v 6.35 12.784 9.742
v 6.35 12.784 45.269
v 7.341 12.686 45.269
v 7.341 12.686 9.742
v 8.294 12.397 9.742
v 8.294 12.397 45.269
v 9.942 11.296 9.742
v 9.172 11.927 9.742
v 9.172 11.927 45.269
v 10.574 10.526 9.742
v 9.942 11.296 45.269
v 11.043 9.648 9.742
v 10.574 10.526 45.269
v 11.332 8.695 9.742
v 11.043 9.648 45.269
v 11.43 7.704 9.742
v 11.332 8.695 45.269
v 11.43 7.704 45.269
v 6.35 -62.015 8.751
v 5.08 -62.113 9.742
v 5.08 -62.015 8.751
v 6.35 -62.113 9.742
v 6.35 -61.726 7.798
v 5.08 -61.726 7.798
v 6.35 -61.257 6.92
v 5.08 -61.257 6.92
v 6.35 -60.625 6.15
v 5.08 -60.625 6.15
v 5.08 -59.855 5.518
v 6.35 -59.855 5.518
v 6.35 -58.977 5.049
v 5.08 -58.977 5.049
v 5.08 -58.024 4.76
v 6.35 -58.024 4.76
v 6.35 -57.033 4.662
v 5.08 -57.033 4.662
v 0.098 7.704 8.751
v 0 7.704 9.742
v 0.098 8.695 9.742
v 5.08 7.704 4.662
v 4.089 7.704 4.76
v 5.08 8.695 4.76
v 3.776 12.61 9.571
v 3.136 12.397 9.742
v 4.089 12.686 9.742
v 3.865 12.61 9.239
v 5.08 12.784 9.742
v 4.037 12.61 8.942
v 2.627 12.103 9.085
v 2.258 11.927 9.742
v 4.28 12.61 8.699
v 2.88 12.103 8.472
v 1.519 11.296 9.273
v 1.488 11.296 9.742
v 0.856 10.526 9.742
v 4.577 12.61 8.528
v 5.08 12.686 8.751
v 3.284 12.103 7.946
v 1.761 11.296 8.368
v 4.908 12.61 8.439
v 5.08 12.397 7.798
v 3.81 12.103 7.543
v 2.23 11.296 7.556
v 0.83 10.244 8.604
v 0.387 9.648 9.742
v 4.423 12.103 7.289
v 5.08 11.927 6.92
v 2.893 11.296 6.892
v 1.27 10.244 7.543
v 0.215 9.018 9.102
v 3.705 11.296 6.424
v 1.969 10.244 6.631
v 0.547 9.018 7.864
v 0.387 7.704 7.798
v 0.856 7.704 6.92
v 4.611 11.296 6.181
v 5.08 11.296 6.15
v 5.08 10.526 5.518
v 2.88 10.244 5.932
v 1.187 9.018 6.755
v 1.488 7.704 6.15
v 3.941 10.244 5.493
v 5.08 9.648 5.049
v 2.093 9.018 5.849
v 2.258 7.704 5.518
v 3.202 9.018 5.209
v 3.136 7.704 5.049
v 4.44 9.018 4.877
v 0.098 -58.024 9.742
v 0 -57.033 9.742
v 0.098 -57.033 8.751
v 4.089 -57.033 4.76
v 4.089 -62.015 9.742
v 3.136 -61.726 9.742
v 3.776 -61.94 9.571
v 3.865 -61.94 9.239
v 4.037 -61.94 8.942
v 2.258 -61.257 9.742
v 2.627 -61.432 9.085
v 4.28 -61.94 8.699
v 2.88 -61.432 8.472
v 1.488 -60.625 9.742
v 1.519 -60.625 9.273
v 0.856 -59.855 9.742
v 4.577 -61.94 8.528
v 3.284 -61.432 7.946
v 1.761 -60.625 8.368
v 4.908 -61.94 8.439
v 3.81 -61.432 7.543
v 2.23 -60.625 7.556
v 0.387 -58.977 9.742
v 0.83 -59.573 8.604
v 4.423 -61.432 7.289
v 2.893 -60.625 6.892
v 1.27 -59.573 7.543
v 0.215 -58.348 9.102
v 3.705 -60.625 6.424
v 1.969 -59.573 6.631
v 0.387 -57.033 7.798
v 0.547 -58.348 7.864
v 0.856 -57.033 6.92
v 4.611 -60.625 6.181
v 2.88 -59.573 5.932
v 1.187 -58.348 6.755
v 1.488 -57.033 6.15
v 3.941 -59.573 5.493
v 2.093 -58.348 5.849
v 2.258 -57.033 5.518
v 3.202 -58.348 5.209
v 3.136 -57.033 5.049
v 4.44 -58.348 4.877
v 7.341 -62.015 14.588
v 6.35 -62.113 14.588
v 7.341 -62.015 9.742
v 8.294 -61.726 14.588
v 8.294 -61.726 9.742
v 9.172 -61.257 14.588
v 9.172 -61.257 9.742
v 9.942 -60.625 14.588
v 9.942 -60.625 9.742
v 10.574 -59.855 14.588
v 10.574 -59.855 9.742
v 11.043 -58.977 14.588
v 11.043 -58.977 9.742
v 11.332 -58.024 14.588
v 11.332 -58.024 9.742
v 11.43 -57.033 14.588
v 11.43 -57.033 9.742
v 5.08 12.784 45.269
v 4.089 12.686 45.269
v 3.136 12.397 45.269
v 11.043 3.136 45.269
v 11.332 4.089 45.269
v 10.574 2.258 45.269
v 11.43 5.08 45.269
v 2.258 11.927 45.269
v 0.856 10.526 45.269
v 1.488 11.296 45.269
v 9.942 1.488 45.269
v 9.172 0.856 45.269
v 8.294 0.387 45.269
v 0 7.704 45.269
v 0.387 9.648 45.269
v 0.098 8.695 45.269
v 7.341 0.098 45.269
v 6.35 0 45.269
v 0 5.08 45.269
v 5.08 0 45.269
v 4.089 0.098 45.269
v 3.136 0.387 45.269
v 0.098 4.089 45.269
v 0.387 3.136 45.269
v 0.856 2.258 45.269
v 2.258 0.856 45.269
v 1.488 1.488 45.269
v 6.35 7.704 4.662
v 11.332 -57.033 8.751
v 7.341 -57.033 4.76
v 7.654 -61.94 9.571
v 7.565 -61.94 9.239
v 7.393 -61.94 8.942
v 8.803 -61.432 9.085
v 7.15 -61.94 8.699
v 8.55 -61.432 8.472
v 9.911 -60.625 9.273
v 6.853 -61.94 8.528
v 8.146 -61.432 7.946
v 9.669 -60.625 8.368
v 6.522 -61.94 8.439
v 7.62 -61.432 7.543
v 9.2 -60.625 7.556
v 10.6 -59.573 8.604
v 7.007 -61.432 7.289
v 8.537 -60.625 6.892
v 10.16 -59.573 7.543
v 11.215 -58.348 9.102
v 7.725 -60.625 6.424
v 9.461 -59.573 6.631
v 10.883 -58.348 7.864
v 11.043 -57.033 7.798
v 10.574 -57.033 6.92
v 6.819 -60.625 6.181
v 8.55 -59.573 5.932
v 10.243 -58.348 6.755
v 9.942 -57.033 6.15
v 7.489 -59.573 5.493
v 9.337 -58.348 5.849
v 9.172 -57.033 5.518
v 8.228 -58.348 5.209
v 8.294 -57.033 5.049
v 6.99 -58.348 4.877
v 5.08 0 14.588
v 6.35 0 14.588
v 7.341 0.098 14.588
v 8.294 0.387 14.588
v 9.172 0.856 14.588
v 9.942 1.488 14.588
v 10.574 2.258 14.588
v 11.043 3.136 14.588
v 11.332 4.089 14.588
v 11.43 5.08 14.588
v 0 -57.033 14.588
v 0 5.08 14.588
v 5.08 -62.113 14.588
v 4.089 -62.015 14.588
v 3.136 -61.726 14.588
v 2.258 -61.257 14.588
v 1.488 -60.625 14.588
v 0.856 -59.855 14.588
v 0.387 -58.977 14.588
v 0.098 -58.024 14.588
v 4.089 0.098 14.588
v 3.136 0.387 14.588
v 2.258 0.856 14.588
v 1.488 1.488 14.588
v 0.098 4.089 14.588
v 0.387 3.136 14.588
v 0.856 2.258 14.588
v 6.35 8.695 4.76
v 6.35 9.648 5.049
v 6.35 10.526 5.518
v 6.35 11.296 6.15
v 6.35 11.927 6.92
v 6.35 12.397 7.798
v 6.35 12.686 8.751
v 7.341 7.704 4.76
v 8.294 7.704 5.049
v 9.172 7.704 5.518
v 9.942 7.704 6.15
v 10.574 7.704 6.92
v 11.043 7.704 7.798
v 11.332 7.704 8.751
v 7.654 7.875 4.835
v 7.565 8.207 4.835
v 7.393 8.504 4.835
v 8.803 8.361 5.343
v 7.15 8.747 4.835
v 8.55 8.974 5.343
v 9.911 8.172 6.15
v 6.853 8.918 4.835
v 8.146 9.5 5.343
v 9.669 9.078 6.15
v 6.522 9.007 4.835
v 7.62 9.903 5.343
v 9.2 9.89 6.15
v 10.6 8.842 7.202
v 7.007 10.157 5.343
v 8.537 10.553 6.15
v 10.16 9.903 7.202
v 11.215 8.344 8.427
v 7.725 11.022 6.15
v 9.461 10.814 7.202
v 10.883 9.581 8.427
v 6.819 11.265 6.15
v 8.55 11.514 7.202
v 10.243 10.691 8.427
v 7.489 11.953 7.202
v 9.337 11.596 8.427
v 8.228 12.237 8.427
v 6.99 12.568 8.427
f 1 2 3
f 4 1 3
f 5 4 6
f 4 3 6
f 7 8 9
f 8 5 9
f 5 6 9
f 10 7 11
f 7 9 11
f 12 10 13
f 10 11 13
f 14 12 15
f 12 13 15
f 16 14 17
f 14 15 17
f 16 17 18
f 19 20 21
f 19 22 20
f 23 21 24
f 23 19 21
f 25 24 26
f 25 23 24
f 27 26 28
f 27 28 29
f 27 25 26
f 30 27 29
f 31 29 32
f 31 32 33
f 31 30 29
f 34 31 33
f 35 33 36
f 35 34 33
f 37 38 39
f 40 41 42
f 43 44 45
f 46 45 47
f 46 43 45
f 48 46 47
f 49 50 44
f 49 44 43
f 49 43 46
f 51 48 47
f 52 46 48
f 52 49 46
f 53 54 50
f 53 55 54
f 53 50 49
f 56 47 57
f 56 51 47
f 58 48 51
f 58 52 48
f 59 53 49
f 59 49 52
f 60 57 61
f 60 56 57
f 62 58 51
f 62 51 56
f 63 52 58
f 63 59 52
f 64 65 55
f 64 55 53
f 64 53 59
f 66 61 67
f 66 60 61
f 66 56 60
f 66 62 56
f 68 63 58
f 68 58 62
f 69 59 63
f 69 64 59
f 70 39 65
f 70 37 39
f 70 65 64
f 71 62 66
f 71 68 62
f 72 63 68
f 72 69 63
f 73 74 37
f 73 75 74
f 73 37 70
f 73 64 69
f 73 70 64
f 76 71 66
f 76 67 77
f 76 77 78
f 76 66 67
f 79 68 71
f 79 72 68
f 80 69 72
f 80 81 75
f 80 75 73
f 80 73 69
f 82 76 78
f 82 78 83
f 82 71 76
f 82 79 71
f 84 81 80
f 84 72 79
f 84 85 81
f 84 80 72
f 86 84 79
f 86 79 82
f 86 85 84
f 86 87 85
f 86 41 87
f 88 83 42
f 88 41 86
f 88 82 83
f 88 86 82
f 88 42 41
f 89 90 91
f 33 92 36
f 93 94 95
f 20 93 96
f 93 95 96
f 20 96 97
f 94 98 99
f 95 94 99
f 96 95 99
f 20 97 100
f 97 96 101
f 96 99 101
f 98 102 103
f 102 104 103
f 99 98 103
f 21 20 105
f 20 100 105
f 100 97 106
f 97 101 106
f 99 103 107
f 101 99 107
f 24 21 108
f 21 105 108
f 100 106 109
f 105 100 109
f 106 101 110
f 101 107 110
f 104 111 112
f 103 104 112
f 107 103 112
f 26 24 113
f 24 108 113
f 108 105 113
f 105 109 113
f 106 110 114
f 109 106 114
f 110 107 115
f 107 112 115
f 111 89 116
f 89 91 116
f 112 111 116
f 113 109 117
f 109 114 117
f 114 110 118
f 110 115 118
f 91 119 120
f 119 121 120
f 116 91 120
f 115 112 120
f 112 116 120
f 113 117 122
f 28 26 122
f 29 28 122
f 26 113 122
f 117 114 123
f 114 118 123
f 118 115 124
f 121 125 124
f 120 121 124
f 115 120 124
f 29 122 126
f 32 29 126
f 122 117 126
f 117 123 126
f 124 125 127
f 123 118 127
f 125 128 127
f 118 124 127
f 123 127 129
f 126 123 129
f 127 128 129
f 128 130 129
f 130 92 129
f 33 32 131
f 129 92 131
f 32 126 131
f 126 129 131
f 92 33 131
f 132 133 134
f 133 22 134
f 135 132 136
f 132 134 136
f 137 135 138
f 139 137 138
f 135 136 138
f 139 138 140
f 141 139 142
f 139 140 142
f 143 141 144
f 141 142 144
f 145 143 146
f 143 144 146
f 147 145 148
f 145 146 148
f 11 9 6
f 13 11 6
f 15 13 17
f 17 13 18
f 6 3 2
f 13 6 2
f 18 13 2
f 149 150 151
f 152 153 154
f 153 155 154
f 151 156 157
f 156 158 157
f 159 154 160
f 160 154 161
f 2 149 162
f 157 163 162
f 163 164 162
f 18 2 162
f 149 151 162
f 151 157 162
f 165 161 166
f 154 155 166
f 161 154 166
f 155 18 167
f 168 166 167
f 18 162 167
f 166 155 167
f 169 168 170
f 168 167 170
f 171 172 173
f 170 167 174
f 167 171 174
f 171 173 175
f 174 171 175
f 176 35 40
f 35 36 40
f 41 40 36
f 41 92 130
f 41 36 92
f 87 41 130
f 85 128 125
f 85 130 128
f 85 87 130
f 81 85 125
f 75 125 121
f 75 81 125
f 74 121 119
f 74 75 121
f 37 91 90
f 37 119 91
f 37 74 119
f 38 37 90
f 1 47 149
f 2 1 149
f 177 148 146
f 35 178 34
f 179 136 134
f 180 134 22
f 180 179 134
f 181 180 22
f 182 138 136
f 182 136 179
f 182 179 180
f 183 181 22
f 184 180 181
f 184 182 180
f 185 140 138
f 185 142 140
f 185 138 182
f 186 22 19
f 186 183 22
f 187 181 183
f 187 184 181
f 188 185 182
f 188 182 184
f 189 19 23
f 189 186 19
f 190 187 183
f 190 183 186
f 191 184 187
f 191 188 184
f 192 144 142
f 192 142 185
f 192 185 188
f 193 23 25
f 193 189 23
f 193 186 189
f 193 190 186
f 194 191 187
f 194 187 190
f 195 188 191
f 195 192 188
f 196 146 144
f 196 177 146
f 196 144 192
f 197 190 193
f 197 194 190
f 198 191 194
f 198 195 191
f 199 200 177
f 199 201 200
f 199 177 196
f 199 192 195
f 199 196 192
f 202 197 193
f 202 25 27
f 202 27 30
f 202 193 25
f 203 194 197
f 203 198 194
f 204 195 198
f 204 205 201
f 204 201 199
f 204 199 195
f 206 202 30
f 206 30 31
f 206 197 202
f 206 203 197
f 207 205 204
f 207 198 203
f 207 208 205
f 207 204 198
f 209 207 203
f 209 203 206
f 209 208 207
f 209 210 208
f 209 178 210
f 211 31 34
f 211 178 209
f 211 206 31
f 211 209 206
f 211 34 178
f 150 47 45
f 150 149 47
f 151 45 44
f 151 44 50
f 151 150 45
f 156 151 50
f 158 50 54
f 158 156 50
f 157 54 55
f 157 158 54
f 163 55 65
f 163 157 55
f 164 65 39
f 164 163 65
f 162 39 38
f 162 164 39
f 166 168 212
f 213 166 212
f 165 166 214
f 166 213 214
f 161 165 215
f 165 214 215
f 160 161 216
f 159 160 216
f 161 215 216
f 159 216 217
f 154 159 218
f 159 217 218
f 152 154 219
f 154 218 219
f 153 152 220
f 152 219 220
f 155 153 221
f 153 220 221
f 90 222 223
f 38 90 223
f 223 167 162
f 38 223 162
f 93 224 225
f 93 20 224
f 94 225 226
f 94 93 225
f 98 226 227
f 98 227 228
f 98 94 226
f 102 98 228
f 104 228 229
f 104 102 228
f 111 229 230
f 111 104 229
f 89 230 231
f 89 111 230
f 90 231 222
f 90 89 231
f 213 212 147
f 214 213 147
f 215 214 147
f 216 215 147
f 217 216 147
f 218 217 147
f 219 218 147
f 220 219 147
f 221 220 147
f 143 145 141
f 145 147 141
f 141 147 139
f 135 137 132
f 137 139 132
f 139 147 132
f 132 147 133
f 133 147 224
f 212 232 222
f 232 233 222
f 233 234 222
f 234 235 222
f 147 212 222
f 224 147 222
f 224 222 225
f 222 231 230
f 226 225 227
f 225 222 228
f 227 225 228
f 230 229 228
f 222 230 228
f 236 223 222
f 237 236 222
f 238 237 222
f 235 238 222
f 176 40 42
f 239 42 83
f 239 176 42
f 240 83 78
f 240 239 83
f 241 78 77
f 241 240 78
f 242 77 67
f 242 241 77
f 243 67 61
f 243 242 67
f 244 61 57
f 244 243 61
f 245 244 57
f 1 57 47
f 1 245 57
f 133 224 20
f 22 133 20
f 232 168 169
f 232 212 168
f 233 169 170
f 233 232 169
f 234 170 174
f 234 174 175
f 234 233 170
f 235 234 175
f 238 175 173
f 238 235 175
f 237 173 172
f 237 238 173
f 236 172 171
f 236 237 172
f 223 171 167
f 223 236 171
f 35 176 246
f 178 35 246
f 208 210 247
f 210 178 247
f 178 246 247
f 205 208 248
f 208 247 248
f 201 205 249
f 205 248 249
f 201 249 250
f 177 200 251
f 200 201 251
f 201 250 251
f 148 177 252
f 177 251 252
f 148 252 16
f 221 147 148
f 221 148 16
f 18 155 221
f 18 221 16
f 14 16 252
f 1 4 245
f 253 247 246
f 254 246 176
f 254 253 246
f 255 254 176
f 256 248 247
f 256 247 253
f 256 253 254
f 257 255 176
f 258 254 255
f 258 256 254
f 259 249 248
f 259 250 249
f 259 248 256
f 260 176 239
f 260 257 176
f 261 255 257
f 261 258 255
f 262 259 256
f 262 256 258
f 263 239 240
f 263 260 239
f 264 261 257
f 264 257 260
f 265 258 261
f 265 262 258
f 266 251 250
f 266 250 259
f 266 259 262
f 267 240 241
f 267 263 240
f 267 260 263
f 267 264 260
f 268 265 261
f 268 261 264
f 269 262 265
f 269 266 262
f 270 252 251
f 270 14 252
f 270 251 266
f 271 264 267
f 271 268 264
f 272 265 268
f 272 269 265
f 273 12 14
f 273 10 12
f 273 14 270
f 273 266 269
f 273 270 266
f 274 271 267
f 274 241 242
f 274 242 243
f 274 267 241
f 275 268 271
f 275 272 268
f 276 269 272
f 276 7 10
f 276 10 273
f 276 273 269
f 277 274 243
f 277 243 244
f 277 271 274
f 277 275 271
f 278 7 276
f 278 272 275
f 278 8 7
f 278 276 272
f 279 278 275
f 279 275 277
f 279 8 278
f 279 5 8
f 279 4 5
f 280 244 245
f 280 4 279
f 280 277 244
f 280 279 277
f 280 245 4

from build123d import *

# Parameters (mm, degrees)
F1_DEPTH = 11.43
F2_R     = 5.08


with BuildPart() as f1:
    # F0 (on Right) → F1 (new body)
    with BuildSketch(Plane.YZ):
        Polygon((0, 14.58829), (-62.113028, 14.58829), (-62.113028, 4.662237), (12.783553, 4.662237), (12.783553, 45.268815), (0, 45.268815), align=None)
    extrude(amount=F1_DEPTH)

    # F2
    f2_edges = [f1.edges().sort_by_distance(p)[0] for p in [
        (11.43, 0, 29.928552),
        (0, 0, 29.928552),
        (11.43, 12.783553, 24.965526),
        (11.43, -24.664737, 4.662237),
        (0, -24.664737, 4.662237),
        (0, 12.783553, 24.965526),
        (0, -62.113028, 9.625264),
        (11.43, -62.113028, 9.625264),
        (5.715, -62.113028, 4.662237),
        (5.715, 12.783553, 4.662237),
    ]]
    fillet(f2_edges, radius=F2_R)


solid = f1.part
